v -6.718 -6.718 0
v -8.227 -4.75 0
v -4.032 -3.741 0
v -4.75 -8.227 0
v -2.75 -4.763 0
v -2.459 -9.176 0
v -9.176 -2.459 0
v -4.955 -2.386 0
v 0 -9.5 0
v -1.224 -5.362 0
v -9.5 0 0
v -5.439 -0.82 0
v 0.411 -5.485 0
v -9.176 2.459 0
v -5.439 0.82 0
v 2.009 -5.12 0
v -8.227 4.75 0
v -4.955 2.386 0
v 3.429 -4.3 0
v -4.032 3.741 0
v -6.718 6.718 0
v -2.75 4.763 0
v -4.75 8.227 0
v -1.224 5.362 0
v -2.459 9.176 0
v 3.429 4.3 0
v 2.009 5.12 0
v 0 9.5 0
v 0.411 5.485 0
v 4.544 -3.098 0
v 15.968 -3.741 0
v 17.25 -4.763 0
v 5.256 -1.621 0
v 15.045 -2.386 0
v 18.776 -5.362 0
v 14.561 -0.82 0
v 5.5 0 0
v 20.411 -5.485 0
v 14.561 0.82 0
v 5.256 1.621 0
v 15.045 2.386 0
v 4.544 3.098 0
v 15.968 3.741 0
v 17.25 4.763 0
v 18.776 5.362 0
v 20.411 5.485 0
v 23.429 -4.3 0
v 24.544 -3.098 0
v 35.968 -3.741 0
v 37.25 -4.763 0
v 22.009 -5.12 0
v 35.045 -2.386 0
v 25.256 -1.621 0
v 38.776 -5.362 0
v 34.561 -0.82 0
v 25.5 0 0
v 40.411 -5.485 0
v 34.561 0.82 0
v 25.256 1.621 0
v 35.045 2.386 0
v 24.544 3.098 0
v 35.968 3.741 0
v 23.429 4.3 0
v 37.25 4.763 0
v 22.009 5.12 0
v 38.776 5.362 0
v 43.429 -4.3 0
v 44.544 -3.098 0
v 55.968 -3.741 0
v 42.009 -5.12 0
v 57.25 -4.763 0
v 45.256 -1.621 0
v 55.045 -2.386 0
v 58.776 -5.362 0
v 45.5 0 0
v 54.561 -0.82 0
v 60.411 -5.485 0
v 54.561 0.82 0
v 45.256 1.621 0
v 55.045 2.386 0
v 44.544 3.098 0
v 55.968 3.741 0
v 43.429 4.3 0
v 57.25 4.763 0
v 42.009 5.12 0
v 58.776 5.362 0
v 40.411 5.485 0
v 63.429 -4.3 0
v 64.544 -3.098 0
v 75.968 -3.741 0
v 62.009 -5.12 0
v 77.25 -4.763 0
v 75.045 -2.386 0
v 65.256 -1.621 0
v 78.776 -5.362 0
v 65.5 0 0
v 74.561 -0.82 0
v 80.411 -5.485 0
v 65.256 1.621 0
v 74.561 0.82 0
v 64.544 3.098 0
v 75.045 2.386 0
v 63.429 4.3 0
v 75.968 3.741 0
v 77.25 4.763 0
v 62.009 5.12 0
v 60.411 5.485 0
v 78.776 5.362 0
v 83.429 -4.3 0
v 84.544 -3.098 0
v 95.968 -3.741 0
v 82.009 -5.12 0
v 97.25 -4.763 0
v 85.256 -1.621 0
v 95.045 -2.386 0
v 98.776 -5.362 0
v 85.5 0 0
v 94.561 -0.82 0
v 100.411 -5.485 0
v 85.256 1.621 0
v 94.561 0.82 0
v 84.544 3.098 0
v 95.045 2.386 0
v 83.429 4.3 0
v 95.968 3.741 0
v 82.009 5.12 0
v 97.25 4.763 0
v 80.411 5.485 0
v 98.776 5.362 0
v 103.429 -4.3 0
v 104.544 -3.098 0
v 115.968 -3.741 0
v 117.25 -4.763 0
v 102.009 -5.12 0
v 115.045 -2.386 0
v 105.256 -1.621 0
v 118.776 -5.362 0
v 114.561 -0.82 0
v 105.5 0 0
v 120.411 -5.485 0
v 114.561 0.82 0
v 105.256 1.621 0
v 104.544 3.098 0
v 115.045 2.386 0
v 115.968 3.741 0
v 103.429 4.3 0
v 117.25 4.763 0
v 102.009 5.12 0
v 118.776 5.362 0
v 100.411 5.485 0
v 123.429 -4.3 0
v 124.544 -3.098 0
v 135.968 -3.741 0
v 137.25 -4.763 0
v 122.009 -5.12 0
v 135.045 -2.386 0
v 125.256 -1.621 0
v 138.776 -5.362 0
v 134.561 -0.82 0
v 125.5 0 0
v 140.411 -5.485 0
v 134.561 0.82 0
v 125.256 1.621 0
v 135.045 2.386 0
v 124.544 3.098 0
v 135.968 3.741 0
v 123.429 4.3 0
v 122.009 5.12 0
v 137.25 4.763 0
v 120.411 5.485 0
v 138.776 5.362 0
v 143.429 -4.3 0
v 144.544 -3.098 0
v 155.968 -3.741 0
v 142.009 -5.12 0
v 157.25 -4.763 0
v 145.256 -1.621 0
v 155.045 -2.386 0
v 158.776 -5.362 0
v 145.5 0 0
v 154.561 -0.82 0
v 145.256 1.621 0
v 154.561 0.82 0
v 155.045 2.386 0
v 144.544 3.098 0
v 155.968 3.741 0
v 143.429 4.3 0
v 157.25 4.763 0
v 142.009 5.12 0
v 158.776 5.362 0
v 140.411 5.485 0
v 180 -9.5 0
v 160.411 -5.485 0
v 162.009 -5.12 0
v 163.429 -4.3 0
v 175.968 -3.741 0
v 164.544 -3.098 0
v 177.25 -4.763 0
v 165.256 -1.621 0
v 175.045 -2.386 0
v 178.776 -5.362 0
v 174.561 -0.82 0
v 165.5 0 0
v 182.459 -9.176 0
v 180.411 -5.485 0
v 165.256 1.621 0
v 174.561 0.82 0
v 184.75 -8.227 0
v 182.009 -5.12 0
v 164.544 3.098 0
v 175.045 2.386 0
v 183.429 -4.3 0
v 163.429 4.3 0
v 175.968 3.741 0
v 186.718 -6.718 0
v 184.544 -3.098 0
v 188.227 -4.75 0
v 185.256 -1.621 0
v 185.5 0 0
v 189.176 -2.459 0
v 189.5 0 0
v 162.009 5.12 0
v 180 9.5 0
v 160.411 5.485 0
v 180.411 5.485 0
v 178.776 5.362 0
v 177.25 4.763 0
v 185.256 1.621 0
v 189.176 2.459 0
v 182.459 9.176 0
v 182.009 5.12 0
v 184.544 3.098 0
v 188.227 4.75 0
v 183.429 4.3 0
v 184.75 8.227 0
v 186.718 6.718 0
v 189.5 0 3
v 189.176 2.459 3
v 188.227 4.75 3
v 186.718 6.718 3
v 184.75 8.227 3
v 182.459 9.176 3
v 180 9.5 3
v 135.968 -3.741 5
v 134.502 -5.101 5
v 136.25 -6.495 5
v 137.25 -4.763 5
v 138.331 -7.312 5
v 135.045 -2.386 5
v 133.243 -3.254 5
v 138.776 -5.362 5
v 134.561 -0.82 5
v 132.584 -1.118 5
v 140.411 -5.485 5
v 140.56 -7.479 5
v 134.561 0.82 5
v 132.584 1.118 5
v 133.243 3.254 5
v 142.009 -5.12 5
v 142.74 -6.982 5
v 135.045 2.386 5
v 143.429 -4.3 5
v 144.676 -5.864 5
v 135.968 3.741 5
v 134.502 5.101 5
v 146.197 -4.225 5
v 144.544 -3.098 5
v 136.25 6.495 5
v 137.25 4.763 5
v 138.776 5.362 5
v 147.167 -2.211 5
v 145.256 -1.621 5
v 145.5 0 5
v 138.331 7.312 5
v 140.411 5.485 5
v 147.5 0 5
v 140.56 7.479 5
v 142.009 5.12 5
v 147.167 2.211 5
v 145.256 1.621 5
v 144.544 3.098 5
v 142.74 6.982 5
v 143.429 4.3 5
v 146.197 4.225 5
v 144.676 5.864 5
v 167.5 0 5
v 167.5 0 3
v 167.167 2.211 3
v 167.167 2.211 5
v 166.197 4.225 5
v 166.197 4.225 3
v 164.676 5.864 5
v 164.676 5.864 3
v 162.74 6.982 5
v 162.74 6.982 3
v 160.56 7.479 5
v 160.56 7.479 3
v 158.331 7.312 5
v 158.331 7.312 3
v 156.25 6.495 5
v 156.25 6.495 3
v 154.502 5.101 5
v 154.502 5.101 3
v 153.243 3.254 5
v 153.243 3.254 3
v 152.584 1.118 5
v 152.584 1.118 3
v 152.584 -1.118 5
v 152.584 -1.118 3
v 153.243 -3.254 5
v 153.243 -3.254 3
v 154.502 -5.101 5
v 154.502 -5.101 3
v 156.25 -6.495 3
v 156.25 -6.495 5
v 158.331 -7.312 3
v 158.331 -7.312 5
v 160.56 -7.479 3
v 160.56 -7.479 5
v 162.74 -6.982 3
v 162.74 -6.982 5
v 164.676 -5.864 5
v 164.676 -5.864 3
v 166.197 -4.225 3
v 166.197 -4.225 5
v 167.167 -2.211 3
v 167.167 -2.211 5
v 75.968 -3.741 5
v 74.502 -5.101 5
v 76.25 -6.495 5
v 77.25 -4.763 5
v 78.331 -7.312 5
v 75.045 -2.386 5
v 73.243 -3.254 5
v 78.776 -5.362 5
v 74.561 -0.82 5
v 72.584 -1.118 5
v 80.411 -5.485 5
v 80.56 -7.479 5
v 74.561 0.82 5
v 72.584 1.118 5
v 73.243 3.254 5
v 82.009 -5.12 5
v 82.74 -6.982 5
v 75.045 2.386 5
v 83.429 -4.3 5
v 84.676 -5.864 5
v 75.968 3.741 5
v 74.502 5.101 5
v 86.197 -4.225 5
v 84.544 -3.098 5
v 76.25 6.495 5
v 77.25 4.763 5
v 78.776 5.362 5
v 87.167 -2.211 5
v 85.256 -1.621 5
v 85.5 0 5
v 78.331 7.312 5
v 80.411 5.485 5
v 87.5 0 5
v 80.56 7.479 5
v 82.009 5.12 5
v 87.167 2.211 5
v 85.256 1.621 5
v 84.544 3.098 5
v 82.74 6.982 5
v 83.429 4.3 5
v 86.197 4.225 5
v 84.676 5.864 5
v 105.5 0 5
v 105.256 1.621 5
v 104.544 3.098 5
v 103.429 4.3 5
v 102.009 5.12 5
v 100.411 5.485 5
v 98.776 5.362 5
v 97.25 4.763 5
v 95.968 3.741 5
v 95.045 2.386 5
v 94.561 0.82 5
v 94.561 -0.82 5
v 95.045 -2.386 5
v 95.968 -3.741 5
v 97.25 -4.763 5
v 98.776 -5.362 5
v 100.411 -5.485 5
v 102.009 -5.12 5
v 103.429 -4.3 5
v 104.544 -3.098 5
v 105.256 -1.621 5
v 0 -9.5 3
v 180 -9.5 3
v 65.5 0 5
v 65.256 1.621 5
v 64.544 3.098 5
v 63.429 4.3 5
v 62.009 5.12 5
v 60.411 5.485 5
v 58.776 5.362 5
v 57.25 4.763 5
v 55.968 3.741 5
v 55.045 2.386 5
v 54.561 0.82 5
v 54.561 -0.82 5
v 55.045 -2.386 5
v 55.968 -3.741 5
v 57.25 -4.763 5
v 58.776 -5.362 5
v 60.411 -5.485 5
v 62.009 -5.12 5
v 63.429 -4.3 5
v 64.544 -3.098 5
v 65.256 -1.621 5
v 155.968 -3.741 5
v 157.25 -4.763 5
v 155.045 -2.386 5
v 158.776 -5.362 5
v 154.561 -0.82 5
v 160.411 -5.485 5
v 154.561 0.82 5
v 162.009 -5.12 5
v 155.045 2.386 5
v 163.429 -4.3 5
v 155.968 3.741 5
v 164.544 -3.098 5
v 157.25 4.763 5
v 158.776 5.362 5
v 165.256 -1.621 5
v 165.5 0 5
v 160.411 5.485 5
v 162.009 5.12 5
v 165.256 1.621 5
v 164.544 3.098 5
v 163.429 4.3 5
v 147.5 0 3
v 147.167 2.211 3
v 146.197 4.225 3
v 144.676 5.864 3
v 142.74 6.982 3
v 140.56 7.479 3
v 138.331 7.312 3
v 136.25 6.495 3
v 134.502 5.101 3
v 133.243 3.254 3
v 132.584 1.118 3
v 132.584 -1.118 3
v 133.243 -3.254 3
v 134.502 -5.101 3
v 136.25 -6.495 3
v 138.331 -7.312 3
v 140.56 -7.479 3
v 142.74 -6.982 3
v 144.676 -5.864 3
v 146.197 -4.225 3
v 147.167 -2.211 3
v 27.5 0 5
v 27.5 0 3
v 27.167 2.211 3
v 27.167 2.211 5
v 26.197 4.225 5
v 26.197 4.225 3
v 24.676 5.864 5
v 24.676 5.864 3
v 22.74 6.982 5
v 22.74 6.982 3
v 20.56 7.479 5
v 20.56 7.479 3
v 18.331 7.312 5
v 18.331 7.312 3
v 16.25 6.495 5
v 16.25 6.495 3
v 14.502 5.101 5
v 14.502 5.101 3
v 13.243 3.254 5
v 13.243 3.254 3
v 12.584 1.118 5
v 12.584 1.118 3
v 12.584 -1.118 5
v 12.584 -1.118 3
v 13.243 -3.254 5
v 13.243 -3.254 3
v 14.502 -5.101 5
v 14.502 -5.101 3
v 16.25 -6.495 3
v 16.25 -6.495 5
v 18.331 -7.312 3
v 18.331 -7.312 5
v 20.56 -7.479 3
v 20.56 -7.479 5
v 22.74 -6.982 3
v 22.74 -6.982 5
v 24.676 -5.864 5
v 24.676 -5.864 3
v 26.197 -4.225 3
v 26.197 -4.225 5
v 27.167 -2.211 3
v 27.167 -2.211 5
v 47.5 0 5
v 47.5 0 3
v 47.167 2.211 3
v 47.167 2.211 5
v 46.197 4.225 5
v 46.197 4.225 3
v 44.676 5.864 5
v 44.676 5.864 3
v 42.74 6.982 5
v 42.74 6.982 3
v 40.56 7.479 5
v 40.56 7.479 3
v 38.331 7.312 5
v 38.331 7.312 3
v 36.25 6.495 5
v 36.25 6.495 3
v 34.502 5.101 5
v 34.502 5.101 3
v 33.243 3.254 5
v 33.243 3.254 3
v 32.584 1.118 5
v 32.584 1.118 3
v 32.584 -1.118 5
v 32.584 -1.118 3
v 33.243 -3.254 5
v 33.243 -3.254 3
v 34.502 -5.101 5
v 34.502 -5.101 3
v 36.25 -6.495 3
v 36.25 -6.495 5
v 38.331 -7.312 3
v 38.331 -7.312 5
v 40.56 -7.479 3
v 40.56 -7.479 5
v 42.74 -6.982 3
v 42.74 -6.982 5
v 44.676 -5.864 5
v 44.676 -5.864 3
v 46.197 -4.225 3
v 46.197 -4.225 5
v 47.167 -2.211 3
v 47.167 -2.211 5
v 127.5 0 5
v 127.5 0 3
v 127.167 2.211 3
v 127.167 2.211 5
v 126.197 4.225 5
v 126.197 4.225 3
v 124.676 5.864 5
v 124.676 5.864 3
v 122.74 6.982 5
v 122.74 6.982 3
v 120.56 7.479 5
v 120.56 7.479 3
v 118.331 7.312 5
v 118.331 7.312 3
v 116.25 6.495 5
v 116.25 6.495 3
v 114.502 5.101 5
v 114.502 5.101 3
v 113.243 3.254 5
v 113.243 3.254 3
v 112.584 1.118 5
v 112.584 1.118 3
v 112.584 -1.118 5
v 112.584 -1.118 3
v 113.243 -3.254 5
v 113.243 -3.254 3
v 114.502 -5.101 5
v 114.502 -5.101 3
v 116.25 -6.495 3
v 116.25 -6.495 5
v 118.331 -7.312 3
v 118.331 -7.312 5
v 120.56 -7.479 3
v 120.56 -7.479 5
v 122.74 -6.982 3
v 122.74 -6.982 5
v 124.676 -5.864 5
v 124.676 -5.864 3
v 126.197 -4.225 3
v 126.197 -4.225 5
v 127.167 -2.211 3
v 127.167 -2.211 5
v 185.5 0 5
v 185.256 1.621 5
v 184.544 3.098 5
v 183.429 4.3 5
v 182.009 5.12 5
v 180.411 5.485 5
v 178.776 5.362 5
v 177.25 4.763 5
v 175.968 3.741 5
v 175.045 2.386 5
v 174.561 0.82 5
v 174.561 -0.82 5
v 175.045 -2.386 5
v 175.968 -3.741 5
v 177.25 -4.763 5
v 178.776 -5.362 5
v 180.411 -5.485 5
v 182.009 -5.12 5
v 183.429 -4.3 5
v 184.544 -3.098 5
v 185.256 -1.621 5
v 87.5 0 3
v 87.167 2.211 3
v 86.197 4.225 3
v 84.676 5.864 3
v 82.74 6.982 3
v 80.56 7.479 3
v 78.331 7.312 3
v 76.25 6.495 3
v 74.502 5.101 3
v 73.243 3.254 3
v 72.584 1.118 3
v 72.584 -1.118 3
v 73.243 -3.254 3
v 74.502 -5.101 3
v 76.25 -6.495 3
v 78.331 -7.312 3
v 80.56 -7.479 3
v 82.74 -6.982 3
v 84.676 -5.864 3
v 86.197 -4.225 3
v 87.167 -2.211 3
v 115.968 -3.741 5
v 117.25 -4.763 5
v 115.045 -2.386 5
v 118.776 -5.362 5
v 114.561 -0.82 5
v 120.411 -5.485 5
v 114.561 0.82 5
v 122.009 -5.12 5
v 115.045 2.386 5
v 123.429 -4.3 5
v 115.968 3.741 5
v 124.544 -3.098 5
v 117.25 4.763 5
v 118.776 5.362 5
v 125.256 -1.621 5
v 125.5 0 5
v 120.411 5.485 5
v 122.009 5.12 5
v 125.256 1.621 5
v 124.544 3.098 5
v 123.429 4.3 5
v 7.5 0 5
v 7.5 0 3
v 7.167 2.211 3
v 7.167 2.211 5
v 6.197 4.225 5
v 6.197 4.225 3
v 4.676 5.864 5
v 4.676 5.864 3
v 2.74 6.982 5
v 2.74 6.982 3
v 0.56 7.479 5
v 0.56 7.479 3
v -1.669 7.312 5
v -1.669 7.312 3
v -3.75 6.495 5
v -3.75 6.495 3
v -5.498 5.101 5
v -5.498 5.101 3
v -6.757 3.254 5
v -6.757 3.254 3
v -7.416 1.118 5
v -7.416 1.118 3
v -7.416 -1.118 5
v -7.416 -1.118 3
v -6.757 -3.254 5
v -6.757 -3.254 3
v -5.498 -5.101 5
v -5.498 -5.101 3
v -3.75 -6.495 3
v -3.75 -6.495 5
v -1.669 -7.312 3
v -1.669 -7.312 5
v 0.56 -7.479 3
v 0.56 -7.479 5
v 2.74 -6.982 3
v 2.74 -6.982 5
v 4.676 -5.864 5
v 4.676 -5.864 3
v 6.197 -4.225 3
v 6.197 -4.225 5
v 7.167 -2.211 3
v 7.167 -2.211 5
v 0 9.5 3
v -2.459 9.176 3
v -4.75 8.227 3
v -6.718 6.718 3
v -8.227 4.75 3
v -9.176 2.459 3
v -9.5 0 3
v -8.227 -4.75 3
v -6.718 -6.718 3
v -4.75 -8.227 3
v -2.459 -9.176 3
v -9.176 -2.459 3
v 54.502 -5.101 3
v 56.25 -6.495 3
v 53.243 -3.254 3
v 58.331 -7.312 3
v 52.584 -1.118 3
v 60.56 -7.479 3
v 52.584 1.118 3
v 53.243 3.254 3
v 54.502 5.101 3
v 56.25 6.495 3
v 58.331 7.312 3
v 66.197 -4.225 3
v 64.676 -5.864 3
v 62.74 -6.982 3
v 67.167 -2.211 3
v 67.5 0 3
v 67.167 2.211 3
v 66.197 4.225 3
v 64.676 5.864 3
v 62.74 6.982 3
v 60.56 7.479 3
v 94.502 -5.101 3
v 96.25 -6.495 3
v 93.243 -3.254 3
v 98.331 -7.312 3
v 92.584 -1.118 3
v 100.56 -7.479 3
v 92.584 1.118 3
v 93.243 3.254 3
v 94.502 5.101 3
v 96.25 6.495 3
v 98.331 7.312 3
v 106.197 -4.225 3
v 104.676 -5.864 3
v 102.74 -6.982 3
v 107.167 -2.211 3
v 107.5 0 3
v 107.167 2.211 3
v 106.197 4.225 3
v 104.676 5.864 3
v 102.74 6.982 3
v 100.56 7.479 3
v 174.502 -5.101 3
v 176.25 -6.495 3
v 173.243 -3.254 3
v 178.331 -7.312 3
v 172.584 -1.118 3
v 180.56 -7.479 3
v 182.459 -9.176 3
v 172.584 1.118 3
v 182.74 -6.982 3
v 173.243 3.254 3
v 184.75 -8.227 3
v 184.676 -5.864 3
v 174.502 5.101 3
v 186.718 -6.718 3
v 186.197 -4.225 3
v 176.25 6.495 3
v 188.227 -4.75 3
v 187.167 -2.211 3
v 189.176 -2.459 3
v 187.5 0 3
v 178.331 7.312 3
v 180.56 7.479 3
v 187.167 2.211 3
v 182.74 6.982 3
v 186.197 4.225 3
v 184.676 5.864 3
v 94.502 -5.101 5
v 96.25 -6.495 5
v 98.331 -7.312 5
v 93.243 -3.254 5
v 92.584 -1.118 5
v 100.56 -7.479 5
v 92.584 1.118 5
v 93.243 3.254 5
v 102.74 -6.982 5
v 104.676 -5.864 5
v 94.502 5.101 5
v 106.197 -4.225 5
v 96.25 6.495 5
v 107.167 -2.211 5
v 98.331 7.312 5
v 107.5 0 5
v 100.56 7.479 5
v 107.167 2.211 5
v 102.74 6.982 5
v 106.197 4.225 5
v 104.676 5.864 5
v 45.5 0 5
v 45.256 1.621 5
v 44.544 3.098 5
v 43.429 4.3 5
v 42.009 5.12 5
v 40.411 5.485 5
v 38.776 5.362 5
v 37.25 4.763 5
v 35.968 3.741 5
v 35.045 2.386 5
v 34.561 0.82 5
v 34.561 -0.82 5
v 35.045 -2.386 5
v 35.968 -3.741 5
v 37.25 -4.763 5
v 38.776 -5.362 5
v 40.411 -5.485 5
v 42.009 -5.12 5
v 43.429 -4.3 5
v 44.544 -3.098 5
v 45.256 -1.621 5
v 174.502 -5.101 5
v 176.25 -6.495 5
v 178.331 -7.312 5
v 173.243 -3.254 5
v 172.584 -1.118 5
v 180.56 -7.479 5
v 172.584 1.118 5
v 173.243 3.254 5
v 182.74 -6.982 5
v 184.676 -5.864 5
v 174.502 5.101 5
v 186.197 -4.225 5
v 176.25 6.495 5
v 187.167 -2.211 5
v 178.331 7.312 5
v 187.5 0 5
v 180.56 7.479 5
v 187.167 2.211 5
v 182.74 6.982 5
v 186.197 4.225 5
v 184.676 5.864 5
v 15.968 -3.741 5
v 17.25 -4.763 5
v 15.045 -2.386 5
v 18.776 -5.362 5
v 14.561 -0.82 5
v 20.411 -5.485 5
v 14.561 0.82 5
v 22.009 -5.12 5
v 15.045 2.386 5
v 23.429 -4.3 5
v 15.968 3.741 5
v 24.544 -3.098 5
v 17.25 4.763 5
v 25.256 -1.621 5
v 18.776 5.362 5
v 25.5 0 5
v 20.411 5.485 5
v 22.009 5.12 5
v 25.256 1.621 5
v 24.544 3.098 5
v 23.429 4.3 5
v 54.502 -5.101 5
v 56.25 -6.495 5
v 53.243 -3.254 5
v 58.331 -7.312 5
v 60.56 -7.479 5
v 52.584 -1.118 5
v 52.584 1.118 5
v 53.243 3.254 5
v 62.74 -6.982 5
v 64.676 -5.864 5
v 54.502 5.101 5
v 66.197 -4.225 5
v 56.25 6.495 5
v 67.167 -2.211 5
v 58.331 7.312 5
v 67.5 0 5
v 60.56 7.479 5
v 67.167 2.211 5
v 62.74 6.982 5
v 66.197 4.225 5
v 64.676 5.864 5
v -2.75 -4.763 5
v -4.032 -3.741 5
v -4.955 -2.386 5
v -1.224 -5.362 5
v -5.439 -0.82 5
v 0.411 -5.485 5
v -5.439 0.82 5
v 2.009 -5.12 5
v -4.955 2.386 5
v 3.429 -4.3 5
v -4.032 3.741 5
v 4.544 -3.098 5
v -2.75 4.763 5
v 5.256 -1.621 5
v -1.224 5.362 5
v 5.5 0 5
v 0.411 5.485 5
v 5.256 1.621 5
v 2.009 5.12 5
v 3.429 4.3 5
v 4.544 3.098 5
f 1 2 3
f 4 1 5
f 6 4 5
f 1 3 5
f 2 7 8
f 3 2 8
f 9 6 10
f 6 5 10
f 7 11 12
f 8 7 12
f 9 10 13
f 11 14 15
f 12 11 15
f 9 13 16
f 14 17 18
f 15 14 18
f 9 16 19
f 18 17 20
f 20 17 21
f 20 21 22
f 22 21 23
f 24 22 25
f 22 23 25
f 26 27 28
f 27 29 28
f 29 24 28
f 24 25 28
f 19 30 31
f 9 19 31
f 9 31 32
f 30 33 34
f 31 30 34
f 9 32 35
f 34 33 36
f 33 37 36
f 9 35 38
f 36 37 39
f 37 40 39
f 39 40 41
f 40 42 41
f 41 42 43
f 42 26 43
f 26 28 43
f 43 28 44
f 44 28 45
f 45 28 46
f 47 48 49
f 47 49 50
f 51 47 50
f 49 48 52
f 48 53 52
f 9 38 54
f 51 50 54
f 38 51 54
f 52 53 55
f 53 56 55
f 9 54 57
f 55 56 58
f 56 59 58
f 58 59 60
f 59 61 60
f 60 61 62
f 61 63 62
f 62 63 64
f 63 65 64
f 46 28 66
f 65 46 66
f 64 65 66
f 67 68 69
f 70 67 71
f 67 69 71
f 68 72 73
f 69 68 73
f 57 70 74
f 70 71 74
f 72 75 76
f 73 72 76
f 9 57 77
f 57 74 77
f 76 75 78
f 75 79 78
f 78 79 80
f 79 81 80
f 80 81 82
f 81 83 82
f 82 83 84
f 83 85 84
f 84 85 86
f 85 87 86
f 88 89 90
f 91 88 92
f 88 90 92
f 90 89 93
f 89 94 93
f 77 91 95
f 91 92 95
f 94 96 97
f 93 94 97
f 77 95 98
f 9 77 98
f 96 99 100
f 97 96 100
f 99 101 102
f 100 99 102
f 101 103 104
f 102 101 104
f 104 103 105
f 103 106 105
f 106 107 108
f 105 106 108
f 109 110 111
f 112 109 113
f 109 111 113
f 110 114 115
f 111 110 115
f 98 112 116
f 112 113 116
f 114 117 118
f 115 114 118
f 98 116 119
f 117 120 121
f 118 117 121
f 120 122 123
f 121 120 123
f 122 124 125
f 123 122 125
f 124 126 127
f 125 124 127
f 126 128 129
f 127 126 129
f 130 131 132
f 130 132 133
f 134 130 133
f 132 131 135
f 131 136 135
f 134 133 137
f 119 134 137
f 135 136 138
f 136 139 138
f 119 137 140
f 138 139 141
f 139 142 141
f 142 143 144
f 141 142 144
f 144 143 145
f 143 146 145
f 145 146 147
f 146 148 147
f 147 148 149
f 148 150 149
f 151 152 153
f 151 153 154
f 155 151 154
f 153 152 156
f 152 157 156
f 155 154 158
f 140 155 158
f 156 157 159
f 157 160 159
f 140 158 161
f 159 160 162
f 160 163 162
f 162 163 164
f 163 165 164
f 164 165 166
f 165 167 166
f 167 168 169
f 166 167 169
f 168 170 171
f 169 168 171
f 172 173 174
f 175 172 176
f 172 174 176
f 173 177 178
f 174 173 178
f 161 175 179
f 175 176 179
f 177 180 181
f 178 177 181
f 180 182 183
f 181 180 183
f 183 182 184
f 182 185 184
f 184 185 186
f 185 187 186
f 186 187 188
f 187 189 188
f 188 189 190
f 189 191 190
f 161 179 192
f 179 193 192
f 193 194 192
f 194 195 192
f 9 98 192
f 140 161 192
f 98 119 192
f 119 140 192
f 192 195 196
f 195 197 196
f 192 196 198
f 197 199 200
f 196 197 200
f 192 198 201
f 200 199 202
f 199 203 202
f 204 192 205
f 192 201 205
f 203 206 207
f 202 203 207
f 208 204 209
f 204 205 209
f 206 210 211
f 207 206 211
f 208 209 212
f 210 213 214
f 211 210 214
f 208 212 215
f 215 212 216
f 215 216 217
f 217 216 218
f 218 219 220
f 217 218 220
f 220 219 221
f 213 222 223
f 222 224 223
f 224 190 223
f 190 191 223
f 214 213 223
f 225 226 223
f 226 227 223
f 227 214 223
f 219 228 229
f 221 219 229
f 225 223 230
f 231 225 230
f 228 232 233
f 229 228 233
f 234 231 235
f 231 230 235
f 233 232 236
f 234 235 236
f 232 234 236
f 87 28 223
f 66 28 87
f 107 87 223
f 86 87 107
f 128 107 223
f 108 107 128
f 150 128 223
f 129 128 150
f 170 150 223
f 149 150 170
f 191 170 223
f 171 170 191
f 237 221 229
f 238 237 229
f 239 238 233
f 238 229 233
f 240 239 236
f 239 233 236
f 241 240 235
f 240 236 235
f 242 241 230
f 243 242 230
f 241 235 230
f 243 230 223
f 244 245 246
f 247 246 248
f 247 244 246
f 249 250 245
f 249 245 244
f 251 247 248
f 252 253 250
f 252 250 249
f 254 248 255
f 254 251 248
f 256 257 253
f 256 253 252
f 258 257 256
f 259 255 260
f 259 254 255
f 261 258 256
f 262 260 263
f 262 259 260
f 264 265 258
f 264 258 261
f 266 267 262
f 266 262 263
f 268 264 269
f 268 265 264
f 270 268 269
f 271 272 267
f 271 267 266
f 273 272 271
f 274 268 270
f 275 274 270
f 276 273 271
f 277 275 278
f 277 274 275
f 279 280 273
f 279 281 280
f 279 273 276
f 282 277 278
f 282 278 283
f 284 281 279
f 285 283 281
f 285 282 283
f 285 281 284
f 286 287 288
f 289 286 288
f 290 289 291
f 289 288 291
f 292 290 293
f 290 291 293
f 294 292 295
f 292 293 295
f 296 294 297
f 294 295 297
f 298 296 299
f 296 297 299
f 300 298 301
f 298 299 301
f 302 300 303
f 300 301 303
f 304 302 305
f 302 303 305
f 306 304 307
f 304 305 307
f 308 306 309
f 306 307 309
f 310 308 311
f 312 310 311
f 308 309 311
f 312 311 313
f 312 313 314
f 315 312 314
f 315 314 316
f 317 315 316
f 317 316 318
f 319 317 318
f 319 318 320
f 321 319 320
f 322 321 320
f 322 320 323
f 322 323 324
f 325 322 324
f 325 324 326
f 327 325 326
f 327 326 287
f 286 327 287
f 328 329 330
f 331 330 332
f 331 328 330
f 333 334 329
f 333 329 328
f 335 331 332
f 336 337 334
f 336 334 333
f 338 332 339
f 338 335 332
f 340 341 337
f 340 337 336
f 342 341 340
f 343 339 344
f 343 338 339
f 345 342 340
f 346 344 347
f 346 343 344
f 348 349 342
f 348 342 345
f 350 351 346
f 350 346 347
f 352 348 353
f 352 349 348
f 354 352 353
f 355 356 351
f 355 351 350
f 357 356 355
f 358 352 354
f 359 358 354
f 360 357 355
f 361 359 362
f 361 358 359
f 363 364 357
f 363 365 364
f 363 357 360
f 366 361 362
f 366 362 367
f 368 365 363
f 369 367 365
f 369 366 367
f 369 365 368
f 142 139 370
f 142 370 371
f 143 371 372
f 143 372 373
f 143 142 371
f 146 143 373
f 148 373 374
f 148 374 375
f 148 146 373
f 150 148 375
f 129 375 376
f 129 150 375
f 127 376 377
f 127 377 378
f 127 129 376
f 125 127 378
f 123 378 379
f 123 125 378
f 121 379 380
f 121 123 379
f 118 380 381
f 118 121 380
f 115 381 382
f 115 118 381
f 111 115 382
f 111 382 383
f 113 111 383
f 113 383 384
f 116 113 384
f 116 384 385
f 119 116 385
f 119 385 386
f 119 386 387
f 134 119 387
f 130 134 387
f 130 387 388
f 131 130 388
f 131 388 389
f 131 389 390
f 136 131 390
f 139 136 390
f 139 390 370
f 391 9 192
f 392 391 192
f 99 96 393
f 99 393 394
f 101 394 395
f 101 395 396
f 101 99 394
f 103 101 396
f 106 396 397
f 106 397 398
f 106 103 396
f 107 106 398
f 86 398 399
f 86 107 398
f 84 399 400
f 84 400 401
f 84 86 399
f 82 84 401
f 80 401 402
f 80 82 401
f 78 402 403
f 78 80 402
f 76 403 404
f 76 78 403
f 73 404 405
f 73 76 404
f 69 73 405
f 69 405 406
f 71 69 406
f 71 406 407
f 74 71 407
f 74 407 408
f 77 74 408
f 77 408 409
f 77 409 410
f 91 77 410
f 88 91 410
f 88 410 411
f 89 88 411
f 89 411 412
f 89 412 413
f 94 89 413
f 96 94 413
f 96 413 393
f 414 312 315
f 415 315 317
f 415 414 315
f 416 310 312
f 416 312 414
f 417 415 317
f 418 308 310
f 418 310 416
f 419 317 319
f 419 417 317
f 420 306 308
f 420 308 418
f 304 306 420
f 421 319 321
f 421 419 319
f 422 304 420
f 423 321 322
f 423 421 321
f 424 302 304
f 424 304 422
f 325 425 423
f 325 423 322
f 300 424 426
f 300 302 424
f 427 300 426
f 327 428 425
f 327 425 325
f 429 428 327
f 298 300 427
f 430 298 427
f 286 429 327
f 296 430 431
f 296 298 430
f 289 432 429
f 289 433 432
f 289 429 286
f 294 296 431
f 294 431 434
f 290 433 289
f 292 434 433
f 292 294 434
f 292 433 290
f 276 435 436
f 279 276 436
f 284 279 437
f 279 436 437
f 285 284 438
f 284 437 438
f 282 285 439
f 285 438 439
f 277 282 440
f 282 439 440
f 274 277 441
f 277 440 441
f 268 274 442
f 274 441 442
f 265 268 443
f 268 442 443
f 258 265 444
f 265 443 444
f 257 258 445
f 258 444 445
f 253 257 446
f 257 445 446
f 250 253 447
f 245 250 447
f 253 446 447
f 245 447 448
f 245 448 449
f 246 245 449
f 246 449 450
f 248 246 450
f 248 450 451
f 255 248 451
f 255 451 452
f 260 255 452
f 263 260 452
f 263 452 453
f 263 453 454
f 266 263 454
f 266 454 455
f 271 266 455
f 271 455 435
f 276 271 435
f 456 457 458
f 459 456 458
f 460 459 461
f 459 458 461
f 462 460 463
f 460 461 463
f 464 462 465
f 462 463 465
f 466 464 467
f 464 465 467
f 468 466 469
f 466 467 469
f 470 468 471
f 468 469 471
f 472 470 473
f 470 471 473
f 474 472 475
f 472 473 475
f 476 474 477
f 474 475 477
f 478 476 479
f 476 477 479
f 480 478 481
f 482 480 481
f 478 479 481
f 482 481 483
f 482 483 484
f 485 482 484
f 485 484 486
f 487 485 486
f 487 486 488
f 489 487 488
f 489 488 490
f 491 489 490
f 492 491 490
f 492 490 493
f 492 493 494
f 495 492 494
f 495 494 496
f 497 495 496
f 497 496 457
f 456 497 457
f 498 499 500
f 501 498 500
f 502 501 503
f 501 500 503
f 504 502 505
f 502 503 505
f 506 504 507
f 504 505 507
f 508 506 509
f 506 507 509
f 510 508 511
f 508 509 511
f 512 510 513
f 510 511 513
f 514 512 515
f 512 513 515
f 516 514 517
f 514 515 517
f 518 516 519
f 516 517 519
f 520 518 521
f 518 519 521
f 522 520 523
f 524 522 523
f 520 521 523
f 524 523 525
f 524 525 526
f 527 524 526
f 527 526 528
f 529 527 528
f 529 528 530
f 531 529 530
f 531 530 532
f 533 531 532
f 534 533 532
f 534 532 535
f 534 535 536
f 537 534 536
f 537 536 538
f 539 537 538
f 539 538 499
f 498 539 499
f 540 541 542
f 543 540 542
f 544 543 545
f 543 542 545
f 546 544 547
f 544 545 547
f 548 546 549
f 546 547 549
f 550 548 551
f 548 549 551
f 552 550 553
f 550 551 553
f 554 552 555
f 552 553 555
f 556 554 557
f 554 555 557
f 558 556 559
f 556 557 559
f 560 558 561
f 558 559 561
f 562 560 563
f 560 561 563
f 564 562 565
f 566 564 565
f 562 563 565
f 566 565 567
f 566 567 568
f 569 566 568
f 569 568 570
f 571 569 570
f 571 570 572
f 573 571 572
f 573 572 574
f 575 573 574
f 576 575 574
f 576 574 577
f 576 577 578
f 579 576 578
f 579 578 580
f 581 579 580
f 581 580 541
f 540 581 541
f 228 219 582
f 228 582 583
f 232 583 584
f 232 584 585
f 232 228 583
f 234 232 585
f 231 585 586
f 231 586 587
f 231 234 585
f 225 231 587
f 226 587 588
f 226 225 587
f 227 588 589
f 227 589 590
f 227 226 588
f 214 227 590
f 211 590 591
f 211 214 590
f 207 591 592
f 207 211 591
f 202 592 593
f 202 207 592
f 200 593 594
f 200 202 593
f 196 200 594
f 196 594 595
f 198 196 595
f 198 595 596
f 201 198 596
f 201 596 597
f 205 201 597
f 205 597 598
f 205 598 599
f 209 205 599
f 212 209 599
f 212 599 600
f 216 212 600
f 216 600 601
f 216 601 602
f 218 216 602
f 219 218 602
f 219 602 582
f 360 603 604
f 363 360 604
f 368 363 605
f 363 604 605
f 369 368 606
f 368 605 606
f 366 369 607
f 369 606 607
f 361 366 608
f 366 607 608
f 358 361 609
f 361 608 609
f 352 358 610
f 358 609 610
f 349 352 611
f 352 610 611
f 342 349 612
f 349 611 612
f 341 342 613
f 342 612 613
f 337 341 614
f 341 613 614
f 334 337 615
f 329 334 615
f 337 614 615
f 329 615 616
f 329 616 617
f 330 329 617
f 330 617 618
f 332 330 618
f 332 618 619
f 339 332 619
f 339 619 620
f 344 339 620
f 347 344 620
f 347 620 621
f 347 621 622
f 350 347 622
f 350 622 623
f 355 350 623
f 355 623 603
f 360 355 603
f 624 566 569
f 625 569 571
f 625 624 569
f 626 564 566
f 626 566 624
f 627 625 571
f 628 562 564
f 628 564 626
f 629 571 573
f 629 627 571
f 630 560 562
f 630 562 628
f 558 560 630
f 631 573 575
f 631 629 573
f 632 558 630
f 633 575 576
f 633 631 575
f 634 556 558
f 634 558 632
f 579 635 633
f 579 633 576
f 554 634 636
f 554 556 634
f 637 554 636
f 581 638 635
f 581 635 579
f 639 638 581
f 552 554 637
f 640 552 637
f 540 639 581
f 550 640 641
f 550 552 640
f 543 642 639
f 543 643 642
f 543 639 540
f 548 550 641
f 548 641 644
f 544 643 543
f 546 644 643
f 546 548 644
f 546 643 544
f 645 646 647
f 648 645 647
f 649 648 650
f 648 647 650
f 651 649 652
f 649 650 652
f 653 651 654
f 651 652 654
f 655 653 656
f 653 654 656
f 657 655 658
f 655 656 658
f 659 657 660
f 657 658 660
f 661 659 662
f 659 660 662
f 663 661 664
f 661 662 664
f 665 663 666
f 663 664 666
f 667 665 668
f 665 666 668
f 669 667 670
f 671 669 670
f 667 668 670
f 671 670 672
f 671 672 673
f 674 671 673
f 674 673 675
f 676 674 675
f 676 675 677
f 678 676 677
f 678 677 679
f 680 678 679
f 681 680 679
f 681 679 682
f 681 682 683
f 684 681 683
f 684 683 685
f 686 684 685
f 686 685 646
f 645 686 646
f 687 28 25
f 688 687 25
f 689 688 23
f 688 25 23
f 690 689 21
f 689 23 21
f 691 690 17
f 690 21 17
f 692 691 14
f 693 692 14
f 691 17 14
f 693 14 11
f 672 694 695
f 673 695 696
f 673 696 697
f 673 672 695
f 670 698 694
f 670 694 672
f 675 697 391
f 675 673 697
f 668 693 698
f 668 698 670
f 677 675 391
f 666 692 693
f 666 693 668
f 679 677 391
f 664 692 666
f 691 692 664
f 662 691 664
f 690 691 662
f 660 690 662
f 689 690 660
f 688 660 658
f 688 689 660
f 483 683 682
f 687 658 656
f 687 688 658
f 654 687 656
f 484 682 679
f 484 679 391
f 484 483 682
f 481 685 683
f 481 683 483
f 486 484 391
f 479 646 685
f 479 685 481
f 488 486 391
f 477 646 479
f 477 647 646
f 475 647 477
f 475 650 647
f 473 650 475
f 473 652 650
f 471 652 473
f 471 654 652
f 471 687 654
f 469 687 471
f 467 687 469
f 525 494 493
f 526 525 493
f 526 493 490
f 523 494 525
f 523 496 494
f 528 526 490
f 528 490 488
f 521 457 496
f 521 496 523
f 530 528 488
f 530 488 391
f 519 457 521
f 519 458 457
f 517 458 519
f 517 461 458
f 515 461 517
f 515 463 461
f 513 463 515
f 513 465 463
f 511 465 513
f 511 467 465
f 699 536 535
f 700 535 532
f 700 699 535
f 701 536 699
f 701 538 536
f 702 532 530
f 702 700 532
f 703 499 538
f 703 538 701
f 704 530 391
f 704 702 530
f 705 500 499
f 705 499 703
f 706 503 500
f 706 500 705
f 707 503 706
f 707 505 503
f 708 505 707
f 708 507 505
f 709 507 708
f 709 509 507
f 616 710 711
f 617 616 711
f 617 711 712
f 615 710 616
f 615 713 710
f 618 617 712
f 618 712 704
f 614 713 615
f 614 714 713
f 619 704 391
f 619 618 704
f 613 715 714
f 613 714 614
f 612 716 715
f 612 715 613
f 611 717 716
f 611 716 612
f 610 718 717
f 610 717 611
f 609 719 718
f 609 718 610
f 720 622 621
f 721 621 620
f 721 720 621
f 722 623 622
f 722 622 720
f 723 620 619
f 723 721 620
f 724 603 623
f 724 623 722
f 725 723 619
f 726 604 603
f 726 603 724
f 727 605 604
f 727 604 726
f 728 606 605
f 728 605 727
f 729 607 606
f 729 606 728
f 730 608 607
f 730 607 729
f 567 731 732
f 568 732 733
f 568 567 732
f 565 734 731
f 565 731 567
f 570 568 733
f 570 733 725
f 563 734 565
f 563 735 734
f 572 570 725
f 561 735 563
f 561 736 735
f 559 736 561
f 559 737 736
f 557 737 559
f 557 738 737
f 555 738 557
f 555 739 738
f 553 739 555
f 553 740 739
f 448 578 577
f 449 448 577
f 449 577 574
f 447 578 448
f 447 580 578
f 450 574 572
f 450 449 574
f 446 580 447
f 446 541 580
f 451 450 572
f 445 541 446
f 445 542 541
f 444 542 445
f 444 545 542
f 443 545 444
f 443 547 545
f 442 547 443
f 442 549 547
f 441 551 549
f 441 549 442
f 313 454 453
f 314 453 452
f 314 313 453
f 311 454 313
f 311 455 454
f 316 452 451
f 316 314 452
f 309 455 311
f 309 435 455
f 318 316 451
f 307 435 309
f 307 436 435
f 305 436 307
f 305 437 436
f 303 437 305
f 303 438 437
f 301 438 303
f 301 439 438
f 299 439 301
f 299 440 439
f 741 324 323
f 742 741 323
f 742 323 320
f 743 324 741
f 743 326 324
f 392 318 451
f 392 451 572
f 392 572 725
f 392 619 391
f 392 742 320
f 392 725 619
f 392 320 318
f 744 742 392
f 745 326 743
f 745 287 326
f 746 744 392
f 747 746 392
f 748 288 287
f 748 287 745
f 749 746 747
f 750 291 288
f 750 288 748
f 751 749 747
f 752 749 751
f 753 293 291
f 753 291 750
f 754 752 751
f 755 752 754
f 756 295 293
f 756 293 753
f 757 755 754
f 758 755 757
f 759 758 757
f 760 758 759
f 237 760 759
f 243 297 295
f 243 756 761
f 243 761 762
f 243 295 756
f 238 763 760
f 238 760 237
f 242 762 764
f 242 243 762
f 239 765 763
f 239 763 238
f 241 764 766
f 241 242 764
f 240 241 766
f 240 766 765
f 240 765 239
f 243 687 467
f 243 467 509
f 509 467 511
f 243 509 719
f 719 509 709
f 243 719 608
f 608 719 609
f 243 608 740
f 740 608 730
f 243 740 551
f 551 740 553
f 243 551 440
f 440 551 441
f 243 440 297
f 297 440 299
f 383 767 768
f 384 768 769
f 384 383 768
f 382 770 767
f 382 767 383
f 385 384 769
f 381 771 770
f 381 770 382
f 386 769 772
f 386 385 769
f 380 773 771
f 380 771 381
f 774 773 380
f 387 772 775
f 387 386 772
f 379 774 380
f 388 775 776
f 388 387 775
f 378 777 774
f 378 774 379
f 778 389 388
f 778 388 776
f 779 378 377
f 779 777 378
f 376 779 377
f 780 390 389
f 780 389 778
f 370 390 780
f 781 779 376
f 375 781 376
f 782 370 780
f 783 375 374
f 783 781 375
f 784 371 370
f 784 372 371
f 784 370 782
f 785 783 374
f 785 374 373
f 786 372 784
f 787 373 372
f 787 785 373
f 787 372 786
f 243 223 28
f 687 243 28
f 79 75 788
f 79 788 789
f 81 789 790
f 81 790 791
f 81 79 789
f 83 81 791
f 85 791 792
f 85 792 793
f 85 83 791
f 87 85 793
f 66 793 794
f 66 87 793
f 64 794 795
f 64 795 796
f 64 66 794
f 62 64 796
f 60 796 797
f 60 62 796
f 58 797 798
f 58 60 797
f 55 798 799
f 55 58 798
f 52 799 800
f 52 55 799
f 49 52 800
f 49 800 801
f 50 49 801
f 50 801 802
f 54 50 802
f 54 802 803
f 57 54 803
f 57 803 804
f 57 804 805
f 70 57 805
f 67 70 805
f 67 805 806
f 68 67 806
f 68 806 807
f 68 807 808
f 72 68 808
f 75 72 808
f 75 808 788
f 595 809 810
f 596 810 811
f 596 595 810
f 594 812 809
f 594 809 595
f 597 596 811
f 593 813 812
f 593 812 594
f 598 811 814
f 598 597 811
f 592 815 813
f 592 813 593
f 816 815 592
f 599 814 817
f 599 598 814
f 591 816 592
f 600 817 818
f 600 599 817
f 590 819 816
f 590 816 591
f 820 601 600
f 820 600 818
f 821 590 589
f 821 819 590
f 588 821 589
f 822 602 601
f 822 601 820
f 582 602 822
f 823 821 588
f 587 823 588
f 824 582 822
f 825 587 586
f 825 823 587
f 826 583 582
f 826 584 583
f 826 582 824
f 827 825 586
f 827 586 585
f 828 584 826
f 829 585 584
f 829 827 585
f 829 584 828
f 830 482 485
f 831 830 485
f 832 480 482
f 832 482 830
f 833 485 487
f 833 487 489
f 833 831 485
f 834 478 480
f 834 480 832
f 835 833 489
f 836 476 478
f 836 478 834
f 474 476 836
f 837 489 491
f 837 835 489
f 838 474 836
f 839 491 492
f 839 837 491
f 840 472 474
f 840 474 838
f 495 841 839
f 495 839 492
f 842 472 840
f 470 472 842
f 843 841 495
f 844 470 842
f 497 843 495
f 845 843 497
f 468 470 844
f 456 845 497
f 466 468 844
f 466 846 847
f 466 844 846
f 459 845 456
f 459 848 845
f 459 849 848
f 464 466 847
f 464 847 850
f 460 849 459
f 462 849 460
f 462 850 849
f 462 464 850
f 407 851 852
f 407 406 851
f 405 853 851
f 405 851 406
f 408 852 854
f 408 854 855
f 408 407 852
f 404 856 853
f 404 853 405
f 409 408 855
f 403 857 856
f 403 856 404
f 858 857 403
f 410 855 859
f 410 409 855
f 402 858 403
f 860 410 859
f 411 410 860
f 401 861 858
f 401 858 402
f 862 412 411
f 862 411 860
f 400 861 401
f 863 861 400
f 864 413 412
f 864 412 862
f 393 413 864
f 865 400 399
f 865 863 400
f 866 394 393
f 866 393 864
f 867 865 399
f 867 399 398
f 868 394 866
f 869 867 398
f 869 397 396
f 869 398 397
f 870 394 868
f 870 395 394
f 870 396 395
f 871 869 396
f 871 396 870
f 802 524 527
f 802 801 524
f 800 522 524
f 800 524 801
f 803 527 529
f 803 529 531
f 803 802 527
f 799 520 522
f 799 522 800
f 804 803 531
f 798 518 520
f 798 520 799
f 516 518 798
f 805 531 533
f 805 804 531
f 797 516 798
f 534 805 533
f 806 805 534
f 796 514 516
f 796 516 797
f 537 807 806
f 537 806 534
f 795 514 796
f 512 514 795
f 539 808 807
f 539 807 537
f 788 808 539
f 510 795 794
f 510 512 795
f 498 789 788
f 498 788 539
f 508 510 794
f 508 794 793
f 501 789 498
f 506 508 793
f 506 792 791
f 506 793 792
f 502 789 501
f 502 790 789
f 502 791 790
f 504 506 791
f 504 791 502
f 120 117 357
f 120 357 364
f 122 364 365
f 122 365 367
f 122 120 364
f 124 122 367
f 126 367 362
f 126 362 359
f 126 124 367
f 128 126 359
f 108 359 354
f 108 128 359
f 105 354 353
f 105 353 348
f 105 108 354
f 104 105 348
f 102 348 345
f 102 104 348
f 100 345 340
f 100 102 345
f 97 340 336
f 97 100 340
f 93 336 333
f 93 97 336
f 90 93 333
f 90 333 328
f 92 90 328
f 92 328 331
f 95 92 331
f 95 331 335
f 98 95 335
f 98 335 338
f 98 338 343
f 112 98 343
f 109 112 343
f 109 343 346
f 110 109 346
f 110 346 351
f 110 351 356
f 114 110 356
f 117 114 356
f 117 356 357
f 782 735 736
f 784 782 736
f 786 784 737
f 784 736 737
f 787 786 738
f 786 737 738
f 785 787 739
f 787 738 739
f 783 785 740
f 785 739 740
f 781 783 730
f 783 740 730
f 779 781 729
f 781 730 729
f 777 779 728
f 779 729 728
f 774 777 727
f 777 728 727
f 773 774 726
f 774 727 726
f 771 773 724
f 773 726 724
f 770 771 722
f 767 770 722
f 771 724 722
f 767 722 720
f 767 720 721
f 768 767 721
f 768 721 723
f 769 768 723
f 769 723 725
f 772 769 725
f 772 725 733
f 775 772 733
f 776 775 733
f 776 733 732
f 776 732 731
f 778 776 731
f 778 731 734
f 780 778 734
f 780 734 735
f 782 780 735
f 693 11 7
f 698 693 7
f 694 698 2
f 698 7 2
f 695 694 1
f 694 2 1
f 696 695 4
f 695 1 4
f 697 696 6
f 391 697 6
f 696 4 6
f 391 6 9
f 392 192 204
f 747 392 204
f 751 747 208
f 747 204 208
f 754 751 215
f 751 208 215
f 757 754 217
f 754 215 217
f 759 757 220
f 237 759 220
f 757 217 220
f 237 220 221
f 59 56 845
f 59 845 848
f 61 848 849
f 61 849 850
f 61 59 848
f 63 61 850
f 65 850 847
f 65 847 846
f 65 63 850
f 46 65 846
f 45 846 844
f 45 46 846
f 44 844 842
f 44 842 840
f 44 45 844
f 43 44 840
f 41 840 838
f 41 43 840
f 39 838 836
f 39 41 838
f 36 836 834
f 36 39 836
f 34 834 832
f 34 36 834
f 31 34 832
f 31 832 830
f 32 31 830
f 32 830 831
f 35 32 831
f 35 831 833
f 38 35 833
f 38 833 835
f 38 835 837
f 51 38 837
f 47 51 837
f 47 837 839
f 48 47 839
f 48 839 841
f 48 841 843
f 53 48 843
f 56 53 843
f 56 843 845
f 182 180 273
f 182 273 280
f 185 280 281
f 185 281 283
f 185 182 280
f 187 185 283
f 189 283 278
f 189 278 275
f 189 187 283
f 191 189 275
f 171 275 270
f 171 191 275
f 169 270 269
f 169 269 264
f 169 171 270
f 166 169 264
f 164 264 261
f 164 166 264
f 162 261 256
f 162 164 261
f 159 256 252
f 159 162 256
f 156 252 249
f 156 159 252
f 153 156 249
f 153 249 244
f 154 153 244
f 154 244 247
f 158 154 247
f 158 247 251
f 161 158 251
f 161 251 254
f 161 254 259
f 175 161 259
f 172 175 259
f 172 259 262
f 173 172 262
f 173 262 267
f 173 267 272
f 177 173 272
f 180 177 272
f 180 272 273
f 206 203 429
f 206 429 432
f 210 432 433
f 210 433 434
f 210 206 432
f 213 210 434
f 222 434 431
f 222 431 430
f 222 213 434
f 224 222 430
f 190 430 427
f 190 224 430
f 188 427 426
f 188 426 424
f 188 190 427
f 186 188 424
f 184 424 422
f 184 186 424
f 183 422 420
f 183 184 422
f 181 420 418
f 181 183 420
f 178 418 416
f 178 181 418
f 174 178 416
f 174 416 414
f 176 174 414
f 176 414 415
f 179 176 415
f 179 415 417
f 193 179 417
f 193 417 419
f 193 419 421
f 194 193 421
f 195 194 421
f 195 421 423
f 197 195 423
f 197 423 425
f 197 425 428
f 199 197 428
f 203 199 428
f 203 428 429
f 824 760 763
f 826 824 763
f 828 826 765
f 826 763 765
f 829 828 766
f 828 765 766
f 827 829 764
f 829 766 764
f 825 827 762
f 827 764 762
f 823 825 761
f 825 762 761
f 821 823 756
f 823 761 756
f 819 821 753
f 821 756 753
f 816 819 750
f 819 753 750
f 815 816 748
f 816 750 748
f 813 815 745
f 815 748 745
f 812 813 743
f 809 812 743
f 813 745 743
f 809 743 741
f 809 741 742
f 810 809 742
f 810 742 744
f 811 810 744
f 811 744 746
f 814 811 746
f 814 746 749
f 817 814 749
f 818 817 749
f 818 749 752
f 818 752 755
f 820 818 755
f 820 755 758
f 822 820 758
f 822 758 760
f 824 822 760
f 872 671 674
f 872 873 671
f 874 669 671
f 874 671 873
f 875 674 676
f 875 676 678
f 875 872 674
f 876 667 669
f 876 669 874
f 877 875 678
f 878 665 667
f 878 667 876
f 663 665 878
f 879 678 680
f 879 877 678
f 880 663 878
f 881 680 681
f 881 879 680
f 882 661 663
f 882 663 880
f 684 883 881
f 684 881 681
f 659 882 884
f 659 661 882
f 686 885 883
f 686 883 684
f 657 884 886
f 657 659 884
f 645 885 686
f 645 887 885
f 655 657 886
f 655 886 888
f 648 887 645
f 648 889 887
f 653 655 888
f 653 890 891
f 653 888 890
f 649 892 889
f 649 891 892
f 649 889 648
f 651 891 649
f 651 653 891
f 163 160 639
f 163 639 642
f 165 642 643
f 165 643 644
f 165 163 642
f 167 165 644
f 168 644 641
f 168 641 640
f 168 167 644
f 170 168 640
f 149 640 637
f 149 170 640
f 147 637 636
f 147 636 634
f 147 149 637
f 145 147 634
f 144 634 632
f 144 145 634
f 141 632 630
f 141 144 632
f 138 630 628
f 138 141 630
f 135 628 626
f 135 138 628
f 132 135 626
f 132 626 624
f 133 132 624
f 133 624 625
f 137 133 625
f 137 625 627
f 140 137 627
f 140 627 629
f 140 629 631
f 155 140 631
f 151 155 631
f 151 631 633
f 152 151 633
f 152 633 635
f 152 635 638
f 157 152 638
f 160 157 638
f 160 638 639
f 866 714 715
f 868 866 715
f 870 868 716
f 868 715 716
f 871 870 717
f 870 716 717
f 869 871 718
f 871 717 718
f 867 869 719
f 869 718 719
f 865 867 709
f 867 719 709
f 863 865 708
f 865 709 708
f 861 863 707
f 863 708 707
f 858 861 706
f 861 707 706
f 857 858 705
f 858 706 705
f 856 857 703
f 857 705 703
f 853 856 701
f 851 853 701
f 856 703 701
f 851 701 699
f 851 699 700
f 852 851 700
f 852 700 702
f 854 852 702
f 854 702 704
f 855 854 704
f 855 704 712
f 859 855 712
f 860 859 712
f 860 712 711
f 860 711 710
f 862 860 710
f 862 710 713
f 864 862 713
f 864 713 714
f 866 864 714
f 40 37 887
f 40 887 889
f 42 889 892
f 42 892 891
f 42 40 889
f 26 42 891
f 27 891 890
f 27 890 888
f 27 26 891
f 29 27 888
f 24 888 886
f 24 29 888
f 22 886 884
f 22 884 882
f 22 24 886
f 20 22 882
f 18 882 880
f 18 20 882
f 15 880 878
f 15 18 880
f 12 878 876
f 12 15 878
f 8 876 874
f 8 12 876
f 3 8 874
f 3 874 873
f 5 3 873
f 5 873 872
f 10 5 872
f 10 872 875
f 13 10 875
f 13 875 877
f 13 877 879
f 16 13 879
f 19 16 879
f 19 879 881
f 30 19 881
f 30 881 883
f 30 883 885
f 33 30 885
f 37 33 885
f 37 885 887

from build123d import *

# Parameters (mm, degrees)
F2_R     = 7.5
F2_R_2   = 5.5
F3_DEPTH = 3
F4_DEPTH = 5


# Not quite as in the source:
# - a feature names something its author has since deleted; it is built from what else it names


with BuildPart() as f3:
    # F2 (on Top) → F3 (new body)
    with BuildSketch(Plane.XY):
        with BuildLine():
            Line((180, 9.5), (0, 9.5))
            ThreePointArc((0, 9.5), (-6.7175144213, 6.7175144213), (-9.5, 0))
            ThreePointArc((-9.5, 0), (-6.7175144213, -6.7175144213), (0, -9.5))
            Line((0, -9.5), (180, -9.5))
            ThreePointArc((180, -9.5), (186.7175144213, -6.7175144213), (189.5, 0))
            ThreePointArc((189.5, 0), (186.7175144213, 6.7175144213), (180, 9.5))
        make_face()
        Circle(F2_R, mode=Mode.SUBTRACT)
        with Locations((20, 0)):
            Circle(F2_R, mode=Mode.SUBTRACT)
        with Locations((40, 0)):
            Circle(F2_R, mode=Mode.SUBTRACT)
        with Locations((60, 0)):
            Circle(F2_R, mode=Mode.SUBTRACT)
        with Locations((80, 0)):
            Circle(F2_R, mode=Mode.SUBTRACT)
        with Locations((100, 0)):
            Circle(F2_R, mode=Mode.SUBTRACT)
        with Locations((120, 0)):
            Circle(F2_R, mode=Mode.SUBTRACT)
        with Locations((140, 0)):
            Circle(F2_R, mode=Mode.SUBTRACT)
        with Locations((160, 0)):
            Circle(F2_R, mode=Mode.SUBTRACT)
        with Locations((180, 0)):
            Circle(F2_R, mode=Mode.SUBTRACT)
        Circle(F2_R)
        Circle(F2_R_2, mode=Mode.SUBTRACT)
        with Locations((20, 0)):
            Circle(F2_R)
        with Locations((20, 0)):
            Circle(F2_R_2, mode=Mode.SUBTRACT)
        with Locations((40, 0)):
            Circle(F2_R)
        with Locations((40, 0)):
            Circle(F2_R_2, mode=Mode.SUBTRACT)
        with Locations((60, 0)):
            Circle(F2_R)
        with Locations((60, 0)):
            Circle(F2_R_2, mode=Mode.SUBTRACT)
        with Locations((80, 0)):
            Circle(F2_R)
        with Locations((80, 0)):
            Circle(F2_R_2, mode=Mode.SUBTRACT)
        with Locations((100, 0)):
            Circle(F2_R)
        with Locations((100, 0)):
            Circle(F2_R_2, mode=Mode.SUBTRACT)
        with Locations((120, 0)):
            Circle(F2_R)
        with Locations((120, 0)):
            Circle(F2_R_2, mode=Mode.SUBTRACT)
        with Locations((140, 0)):
            Circle(F2_R)
        with Locations((140, 0)):
            Circle(F2_R_2, mode=Mode.SUBTRACT)
        with Locations((160, 0)):
            Circle(F2_R)
        with Locations((160, 0)):
            Circle(F2_R_2, mode=Mode.SUBTRACT)
        with Locations((180, 0)):
            Circle(F2_R)
        with Locations((180, 0)):
            Circle(F2_R_2, mode=Mode.SUBTRACT)
    extrude(amount=F3_DEPTH)

    # F2 (on Top) → F4 (join)
    with BuildSketch(Plane.XY):
        Circle(F2_R)
        Circle(F2_R_2, mode=Mode.SUBTRACT)
        with Locations((20, 0)):
            Circle(F2_R)
        with Locations((20, 0)):
            Circle(F2_R_2, mode=Mode.SUBTRACT)
        with Locations((40, 0)):
            Circle(F2_R)
        with Locations((40, 0)):
            Circle(F2_R_2, mode=Mode.SUBTRACT)
        with Locations((60, 0)):
            Circle(F2_R)
        with Locations((60, 0)):
            Circle(F2_R_2, mode=Mode.SUBTRACT)
        with Locations((80, 0)):
            Circle(F2_R)
        with Locations((80, 0)):
            Circle(F2_R_2, mode=Mode.SUBTRACT)
        with Locations((100, 0)):
            Circle(F2_R)
        with Locations((100, 0)):
            Circle(F2_R_2, mode=Mode.SUBTRACT)
        with Locations((120, 0)):
            Circle(F2_R)
        with Locations((120, 0)):
            Circle(F2_R_2, mode=Mode.SUBTRACT)
        with Locations((140, 0)):
            Circle(F2_R)
        with Locations((140, 0)):
            Circle(F2_R_2, mode=Mode.SUBTRACT)
        with Locations((160, 0)):
            Circle(F2_R)
        with Locations((160, 0)):
            Circle(F2_R_2, mode=Mode.SUBTRACT)
        with Locations((180, 0)):
            Circle(F2_R)
        with Locations((180, 0)):
            Circle(F2_R_2, mode=Mode.SUBTRACT)
    extrude(amount=F4_DEPTH)


solid = f3.part
